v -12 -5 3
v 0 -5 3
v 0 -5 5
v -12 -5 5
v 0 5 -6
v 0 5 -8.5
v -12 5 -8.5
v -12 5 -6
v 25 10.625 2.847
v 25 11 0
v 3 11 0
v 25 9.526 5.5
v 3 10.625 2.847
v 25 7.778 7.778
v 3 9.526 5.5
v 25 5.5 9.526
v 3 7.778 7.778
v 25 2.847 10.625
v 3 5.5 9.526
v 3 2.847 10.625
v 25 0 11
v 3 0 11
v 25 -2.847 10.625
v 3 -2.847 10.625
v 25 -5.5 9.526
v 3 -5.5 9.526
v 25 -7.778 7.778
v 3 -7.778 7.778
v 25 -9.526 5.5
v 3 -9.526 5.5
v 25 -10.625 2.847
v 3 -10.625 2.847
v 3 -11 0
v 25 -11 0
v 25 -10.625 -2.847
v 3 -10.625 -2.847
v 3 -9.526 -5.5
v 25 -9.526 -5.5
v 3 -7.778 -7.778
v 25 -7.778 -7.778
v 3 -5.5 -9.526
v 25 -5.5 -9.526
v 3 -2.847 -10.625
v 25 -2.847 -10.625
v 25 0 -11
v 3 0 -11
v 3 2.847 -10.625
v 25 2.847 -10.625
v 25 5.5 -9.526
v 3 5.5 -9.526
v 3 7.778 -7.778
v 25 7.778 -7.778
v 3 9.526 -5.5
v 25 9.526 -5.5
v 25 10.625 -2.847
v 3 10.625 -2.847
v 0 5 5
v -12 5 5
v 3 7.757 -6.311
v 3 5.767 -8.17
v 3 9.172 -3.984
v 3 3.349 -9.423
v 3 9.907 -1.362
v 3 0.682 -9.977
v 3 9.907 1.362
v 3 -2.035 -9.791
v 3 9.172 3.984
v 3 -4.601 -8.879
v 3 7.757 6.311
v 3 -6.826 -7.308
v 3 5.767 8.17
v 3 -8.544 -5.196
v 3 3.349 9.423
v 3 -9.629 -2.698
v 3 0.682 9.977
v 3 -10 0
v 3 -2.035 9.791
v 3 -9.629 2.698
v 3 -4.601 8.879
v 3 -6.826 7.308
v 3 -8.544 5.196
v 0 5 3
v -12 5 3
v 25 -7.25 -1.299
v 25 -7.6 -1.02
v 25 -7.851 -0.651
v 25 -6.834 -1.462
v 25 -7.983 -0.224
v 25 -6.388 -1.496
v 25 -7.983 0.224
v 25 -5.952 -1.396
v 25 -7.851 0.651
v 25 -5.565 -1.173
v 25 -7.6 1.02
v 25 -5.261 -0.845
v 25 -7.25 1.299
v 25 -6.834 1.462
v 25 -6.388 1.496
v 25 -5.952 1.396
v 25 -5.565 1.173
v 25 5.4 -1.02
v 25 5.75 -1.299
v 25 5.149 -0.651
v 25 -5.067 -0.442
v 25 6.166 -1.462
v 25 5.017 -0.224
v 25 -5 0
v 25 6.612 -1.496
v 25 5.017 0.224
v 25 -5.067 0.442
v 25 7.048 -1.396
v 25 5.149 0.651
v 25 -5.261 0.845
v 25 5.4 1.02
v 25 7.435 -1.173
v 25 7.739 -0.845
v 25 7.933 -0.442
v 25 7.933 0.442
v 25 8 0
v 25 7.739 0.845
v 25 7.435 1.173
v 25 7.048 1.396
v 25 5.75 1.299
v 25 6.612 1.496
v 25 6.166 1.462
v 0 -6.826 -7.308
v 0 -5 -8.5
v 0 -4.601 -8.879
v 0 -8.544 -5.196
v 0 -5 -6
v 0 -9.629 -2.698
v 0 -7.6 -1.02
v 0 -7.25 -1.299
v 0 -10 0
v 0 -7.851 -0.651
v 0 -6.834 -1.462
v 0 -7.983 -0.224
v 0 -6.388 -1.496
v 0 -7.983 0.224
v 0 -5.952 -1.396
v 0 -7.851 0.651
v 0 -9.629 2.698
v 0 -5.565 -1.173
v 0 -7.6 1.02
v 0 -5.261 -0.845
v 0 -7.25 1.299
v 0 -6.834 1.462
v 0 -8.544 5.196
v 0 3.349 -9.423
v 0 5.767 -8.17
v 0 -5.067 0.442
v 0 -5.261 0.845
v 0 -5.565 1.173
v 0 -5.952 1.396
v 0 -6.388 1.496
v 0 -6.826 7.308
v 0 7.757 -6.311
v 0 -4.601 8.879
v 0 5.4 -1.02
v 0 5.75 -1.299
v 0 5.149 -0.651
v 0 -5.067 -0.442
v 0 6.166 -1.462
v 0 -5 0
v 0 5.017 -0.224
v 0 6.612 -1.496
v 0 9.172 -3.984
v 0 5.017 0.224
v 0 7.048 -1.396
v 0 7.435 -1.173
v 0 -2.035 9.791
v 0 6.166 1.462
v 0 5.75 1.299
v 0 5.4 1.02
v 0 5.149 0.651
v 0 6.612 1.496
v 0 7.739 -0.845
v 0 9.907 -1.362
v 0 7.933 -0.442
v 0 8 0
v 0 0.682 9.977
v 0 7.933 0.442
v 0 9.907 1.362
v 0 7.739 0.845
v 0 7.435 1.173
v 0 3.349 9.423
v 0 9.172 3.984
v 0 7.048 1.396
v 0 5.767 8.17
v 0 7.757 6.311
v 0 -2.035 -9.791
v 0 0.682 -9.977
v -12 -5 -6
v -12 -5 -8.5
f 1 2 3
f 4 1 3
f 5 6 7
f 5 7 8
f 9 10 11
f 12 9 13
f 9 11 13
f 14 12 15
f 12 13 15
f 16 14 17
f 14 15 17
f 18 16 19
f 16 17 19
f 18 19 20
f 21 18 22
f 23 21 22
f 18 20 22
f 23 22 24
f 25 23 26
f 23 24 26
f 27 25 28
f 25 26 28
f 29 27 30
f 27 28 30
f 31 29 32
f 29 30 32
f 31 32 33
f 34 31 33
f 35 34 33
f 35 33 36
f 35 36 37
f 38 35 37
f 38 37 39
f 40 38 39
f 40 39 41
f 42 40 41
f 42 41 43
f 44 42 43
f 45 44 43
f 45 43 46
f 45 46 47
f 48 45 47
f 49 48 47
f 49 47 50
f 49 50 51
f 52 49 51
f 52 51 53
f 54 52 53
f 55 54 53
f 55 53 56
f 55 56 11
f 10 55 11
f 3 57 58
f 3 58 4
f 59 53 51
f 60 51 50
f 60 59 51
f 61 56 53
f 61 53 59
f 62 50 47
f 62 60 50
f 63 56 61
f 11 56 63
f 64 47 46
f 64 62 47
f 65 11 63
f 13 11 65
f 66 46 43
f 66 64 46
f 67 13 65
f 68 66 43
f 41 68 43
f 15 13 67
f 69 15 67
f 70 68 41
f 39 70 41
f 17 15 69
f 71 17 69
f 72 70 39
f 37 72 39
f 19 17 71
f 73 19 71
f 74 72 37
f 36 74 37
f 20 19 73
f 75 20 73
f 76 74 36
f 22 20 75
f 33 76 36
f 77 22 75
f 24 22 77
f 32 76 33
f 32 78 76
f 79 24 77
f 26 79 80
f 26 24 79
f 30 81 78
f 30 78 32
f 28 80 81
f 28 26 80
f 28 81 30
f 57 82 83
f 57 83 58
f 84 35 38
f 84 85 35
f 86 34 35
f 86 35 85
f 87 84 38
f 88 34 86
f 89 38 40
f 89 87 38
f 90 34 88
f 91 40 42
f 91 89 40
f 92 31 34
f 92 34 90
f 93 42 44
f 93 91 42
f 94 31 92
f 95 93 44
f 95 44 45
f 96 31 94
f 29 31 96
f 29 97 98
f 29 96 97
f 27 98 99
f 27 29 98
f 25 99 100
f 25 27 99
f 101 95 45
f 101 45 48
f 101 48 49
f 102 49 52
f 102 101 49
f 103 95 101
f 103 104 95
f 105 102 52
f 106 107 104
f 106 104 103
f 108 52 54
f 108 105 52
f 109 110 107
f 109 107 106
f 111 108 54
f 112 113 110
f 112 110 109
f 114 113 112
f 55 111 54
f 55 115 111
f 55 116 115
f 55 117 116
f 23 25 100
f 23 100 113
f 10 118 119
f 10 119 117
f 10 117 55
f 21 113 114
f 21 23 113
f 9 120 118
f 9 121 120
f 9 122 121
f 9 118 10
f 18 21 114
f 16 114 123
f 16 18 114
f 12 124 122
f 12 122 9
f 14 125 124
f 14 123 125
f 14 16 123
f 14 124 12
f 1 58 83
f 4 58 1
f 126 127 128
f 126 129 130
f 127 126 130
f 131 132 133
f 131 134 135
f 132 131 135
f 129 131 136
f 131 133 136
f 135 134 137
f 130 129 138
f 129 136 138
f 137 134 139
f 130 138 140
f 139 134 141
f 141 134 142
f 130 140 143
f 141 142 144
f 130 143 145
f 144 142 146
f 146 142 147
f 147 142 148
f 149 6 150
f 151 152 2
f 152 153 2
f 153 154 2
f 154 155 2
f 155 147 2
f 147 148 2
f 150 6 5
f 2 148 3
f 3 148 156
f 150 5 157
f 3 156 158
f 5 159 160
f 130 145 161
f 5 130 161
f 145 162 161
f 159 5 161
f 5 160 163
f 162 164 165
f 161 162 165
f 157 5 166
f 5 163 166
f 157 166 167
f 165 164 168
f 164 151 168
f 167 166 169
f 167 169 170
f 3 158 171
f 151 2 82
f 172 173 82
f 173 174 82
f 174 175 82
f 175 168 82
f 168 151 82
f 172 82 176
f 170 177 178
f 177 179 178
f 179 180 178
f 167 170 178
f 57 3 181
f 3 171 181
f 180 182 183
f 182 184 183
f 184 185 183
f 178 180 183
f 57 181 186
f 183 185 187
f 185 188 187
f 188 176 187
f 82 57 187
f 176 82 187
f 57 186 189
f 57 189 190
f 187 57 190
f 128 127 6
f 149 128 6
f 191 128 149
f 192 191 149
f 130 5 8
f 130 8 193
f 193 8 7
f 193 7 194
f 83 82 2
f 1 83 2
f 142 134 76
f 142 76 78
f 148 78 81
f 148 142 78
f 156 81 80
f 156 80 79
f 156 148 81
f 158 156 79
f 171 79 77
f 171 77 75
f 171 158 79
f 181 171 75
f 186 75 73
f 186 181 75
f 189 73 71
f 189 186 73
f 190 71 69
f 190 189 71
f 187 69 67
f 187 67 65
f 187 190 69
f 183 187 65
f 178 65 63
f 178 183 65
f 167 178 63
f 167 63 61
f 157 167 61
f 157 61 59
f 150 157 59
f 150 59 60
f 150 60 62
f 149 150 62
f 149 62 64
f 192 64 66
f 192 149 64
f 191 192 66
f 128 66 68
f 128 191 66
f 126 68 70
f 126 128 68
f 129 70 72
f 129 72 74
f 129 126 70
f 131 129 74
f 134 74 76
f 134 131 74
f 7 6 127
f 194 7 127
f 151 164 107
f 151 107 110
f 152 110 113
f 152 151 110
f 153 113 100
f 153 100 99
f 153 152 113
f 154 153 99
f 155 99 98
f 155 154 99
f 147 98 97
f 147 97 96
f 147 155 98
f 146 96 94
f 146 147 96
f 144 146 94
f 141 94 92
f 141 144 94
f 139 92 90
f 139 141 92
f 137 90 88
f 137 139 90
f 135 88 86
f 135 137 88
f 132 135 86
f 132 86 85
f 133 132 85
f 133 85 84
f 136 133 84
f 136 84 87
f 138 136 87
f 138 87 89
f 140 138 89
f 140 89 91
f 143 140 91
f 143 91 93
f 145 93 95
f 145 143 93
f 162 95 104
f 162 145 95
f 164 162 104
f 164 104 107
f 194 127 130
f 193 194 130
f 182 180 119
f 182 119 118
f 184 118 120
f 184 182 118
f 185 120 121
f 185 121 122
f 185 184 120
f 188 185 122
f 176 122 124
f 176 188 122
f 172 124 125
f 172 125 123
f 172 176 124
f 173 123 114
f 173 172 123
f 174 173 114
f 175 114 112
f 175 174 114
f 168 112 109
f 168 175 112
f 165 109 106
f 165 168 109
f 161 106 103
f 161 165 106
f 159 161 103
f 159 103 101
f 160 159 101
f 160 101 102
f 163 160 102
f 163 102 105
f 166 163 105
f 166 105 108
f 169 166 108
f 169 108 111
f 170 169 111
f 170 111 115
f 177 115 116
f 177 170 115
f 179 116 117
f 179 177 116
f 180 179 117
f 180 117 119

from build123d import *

# Parameters (mm, degrees)
F0_R     = 11
F0_R_2   = 1.5
F1_DEPTH = 25
F2_R     = 12.5
F2_R_2   = 10
F3_DEPTH = 3
F4_W     = 10
F4_H     = 2
F4_H_2   = 2.5
F5_DEPTH = 12


with BuildPart() as f1:
    # F0 (on Right) → F1 (new body)
    with BuildSketch(Plane.YZ):
        Circle(F0_R)
        with Locations((-6.5, 0)):
            Circle(F0_R_2, mode=Mode.SUBTRACT)
        with Locations((6.5, 0)):
            Circle(F0_R_2, mode=Mode.SUBTRACT)
    extrude(amount=F1_DEPTH)

    # F2 (on face) → F3 (cut)
    with BuildSketch(Plane(origin=(0, 0, 0), x_dir=(0, -1, 0), z_dir=(-1, 0, 0))):
        Circle(F2_R)
        Circle(F2_R_2, mode=Mode.SUBTRACT)
    extrude(amount=-F3_DEPTH, mode=Mode.SUBTRACT)

    # F4 (on face) → F5 (join)
    with BuildSketch(Plane(origin=(0, 0, 0), x_dir=(0, -1, 0), z_dir=(-1, 0, 0))):
        with Locations((0, 4)):
            Rectangle(F4_W, F4_H)
        with Locations((0, -7.25)):
            Rectangle(F4_W, F4_H_2)
    extrude(amount=F5_DEPTH)


solid = f1.part
